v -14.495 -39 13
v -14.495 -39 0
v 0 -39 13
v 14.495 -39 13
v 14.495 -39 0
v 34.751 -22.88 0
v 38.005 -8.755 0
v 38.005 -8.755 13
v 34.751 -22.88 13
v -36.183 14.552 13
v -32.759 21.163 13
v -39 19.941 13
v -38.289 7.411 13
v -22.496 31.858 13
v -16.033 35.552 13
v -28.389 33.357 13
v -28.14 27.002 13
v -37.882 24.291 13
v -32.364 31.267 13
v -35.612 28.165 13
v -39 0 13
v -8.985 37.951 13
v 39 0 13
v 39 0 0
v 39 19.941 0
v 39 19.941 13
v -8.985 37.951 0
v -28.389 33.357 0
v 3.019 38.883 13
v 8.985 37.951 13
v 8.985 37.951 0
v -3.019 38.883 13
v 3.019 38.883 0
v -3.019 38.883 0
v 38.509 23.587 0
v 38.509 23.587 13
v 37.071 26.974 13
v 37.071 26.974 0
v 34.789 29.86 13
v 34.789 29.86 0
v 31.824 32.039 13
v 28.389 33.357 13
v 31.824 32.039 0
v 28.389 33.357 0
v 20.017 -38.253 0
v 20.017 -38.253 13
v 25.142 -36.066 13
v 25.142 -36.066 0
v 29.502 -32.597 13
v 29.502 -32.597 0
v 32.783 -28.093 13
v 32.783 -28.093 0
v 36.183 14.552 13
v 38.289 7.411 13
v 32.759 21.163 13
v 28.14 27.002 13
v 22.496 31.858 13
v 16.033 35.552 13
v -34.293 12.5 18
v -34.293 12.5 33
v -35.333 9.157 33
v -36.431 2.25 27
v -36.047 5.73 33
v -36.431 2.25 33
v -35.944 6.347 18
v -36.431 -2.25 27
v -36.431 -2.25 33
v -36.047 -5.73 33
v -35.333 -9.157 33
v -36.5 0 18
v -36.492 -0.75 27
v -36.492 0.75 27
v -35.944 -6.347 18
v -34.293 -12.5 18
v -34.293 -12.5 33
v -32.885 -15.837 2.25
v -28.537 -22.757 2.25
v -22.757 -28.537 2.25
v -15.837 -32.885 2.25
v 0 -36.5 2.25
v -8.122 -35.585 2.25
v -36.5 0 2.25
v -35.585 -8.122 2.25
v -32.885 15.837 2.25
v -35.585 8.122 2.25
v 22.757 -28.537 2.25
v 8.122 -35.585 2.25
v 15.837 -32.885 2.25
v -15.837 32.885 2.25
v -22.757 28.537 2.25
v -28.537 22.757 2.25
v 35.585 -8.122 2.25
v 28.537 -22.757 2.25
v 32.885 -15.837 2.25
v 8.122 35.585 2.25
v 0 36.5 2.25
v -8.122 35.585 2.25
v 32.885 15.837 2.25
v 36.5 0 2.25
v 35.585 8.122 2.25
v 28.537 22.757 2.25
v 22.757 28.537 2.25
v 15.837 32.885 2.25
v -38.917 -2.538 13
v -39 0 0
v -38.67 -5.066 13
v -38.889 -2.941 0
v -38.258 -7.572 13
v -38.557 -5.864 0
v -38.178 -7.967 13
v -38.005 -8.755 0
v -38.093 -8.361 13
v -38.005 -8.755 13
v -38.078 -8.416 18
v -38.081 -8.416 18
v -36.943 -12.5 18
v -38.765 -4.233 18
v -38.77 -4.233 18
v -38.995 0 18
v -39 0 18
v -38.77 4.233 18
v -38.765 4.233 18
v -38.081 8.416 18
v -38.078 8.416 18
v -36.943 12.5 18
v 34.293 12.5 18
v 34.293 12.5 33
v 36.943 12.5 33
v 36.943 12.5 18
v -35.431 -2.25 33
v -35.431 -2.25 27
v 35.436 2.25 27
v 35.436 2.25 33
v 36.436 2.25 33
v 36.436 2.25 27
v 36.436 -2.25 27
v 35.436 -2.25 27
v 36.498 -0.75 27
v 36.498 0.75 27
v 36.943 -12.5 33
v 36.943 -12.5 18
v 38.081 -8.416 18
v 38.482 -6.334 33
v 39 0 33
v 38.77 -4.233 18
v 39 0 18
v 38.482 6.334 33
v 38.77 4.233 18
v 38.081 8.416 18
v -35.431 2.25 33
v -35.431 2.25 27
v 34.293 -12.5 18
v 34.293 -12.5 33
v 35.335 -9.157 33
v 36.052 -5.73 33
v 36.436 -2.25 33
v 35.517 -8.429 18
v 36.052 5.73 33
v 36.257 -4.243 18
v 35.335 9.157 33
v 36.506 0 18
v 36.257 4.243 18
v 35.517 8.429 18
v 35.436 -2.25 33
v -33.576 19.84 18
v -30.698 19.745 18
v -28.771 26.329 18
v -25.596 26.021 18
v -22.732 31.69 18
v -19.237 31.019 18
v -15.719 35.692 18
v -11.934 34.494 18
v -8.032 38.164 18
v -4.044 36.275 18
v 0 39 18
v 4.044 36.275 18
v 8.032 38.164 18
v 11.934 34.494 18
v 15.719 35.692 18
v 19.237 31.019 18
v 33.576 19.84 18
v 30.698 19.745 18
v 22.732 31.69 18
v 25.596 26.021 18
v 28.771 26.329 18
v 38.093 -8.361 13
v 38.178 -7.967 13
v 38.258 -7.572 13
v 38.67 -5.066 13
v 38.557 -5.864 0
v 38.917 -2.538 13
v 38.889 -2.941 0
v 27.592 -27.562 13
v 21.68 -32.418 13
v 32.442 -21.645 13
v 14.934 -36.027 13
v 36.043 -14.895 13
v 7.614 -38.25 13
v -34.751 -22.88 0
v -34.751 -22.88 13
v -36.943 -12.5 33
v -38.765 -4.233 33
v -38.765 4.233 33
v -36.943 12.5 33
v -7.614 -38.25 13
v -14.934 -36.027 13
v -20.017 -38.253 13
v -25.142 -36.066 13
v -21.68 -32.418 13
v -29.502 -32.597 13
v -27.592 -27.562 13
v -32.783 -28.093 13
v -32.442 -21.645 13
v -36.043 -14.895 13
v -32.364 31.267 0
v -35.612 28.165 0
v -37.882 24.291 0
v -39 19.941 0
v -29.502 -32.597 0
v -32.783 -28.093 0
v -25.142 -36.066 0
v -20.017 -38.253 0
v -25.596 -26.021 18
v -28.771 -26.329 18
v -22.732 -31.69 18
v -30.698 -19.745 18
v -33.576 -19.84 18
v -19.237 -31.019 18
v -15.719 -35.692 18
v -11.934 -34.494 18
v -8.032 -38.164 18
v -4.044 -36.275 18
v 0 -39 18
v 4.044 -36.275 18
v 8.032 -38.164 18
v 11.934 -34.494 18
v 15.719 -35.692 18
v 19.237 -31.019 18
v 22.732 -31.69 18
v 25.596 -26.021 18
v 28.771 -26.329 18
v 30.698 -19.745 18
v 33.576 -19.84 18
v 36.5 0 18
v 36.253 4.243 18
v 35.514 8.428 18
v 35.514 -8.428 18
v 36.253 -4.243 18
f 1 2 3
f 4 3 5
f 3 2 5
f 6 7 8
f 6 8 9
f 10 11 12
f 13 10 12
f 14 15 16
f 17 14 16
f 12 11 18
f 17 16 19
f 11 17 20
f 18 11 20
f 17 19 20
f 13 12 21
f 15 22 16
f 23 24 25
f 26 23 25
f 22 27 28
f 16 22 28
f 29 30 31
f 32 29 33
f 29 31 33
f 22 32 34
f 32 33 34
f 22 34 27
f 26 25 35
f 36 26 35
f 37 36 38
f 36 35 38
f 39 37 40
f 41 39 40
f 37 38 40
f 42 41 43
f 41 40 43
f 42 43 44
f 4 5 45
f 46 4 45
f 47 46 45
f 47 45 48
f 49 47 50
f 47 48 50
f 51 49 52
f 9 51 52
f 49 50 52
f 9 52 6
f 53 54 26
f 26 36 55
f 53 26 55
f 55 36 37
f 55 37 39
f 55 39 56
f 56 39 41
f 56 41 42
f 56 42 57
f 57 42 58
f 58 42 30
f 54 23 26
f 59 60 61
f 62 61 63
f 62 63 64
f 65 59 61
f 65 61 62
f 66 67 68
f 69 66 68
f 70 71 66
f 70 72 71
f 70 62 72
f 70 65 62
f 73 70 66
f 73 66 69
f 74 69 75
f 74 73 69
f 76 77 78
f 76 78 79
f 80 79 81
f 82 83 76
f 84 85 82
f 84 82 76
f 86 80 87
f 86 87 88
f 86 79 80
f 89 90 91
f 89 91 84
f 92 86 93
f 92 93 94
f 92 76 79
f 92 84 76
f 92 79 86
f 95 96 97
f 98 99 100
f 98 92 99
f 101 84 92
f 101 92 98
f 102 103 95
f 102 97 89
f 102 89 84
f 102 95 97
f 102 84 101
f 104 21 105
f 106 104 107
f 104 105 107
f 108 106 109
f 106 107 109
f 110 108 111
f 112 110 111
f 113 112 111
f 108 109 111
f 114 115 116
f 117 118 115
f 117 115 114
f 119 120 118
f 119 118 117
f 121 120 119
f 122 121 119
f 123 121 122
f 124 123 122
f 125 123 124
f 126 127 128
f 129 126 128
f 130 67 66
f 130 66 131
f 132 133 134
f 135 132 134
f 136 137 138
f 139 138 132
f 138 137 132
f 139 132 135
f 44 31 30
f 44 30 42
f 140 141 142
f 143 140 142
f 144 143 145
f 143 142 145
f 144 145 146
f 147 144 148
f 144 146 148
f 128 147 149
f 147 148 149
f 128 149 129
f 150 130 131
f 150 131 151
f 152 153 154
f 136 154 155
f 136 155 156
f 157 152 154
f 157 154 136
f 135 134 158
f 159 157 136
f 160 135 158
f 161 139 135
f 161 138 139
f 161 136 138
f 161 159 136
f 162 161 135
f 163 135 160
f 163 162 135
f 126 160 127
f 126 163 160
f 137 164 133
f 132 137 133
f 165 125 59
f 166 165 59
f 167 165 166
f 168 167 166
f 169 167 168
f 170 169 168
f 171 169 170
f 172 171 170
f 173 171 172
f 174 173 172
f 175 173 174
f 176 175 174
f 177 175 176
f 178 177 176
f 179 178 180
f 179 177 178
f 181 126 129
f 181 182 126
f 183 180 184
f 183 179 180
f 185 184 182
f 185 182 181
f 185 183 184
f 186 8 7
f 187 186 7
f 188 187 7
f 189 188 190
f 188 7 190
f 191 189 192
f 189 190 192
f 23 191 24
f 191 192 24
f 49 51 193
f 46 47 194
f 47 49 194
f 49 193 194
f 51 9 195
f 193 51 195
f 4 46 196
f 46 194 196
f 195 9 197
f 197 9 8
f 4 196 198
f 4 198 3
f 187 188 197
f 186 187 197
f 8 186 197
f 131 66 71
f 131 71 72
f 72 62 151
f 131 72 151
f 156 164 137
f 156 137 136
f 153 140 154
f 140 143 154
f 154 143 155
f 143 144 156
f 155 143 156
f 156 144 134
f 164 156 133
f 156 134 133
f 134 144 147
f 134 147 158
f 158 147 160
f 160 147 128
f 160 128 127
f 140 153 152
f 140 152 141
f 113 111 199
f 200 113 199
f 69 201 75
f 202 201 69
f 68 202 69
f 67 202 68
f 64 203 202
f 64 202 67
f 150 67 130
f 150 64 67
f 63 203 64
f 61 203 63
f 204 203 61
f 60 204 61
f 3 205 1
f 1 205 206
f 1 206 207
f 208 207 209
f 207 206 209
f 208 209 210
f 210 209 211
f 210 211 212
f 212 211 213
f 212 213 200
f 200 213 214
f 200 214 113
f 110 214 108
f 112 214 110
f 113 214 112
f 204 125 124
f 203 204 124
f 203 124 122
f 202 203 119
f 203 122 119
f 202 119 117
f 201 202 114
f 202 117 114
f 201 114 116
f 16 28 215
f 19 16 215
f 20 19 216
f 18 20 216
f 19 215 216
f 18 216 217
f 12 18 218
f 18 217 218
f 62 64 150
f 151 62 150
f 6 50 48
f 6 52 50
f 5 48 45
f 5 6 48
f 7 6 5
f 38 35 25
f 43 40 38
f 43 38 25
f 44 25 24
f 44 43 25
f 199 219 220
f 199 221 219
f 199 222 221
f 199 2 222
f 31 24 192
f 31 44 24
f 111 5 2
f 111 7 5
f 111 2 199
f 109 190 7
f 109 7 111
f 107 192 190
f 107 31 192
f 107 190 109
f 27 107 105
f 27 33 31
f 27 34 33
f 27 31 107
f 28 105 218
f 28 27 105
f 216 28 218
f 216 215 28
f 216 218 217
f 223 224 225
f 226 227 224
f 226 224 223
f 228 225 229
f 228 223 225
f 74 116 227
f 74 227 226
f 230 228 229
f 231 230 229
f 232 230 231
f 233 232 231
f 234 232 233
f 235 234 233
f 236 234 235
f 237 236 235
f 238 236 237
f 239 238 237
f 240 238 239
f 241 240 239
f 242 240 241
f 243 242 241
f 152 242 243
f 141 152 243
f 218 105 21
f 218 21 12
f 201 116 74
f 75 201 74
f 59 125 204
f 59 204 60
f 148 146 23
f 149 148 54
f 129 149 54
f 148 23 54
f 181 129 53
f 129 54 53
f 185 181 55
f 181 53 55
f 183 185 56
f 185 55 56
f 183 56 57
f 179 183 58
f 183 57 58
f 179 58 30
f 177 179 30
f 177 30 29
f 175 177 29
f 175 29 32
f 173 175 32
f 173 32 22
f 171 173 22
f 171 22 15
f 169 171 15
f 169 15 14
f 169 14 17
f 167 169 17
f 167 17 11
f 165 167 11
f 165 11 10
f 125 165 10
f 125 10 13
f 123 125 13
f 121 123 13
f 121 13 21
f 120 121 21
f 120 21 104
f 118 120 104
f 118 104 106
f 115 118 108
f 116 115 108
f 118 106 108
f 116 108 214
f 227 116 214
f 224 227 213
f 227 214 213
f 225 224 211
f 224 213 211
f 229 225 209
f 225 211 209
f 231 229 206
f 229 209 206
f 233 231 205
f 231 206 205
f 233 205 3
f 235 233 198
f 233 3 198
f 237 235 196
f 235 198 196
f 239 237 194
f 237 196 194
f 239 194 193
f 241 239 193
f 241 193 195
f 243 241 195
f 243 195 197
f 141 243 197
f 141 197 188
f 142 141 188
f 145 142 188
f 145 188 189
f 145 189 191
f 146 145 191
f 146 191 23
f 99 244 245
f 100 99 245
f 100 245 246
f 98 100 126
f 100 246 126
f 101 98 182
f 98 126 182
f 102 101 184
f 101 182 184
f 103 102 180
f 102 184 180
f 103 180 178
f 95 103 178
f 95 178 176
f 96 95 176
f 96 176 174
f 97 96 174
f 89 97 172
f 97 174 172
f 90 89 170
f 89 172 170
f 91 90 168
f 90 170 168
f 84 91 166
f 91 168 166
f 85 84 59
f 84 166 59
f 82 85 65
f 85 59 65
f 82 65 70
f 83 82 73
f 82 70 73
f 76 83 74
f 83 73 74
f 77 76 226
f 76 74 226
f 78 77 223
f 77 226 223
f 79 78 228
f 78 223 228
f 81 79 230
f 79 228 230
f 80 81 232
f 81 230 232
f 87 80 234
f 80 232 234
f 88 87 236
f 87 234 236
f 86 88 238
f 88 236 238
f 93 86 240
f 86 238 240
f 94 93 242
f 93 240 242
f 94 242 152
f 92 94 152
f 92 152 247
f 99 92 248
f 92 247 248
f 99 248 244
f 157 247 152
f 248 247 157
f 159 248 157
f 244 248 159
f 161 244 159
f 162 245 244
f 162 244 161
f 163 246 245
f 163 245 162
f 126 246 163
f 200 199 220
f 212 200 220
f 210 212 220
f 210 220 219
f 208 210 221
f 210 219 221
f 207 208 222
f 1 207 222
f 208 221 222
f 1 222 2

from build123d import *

# Parameters (mm, degrees)
PAD_DEPTH     = 13
SKETCH001_R   = 39
PAD001_DEPTH  = 5
SKETCH002_R   = 36.5
POCKET_DEPTH  = 15.75
PAD002_DEPTH  = 15
SKETCH004_W   = 2.317019
SKETCH004_H   = 4.5
SKETCH004_W_2 = 2.064228
PAD003_DEPTH  = 6


with BuildPart() as part:
    # Sketch → Pad (new body)
    with BuildSketch(Plane.XY):
        with BuildLine():
            Line((8.98454, 37.950995), (28.389288, 33.357104))
            ThreePointArc((39, 19.941115), (36.026709, 28.493542), (28.389288, 33.357104))
            Line((39, 0), (39, 19.941115))
            ThreePointArc((38.00467, -8.754718), (38.750368, -4.405558), (39, 0))
            Line((38.00467, -8.754718), (34.750723, -22.880263))
            ThreePointArc((14.495489, -39), (27.438831, -34.478227), (34.750723, -22.880263))
            Line((4e-06, -39), (14.495489, -39))
            Line((4e-06, -39), (-14.495489, -39))
            ThreePointArc((-34.750723, -22.880263), (-27.438831, -34.478227), (-14.495489, -39))
            Line((-38.00467, -8.754718), (-34.750723, -22.880263))
            ThreePointArc((-39, 0), (-38.750368, -4.405558), (-38.00467, -8.754718))
            Line((-39, 0), (-39, 19.941115))
            ThreePointArc((-28.389288, 33.357104), (-35.611883, 28.165455), (-39, 19.941115))
            Line((-8.98454, 37.950995), (-28.389288, 33.357104))
            ThreePointArc((8.98454, 37.950995), (0, 39), (-8.98454, 37.950995))
        make_face()
    extrude(amount=PAD_DEPTH)

    # Sketch001 (on Face17 of Pad) → Pad001 (join)
    with BuildSketch(Plane.XY.offset(13)):
        Circle(SKETCH001_R)
    extrude(amount=PAD001_DEPTH)

    # Sketch002 (on Face22 of Pad001) → Pocket (cut)
    with BuildSketch(Plane.XY.offset(18)):
        Circle(SKETCH002_R)
    extrude(amount=-POCKET_DEPTH, mode=Mode.SUBTRACT)

    # Sketch003 (on Face22 of Pocket) → Pad002 (join)
    with BuildSketch(Plane.XY.offset(18)):
        with BuildLine():
            ThreePointArc((-36.942523, 12.5), (-38.995202, 0), (-36.942523, -12.5))
            Line((-36.942523, -12.5), (-34.292856, -12.5))
            ThreePointArc((-34.292856, 12.5), (-36.5, 0), (-34.292856, -12.5))
            Line((-36.942523, 12.5), (-34.292856, 12.5))
        make_face()
        with BuildLine():
            ThreePointArc((34.292856, -12.5), (36.505526, 0), (34.292856, 12.5))
            Line((34.292856, 12.5), (36.942523, 12.5))
            ThreePointArc((36.942523, -12.5), (39, 0), (36.942523, 12.5))
            Line((34.292856, -12.5), (36.942523, -12.5))
        make_face()
    extrude(amount=PAD002_DEPTH)

    # Sketch004 (on Face35 of Pad002) → Pad003 (join)
    with BuildSketch(Plane.XY.offset(33)):
        with Locations((-36.589095, 0)):
            Rectangle(SKETCH004_W, SKETCH004_H)
        with Locations((36.468061, 0)):
            Rectangle(SKETCH004_W_2, SKETCH004_H)
    extrude(amount=-PAD003_DEPTH)


solid = part.part
